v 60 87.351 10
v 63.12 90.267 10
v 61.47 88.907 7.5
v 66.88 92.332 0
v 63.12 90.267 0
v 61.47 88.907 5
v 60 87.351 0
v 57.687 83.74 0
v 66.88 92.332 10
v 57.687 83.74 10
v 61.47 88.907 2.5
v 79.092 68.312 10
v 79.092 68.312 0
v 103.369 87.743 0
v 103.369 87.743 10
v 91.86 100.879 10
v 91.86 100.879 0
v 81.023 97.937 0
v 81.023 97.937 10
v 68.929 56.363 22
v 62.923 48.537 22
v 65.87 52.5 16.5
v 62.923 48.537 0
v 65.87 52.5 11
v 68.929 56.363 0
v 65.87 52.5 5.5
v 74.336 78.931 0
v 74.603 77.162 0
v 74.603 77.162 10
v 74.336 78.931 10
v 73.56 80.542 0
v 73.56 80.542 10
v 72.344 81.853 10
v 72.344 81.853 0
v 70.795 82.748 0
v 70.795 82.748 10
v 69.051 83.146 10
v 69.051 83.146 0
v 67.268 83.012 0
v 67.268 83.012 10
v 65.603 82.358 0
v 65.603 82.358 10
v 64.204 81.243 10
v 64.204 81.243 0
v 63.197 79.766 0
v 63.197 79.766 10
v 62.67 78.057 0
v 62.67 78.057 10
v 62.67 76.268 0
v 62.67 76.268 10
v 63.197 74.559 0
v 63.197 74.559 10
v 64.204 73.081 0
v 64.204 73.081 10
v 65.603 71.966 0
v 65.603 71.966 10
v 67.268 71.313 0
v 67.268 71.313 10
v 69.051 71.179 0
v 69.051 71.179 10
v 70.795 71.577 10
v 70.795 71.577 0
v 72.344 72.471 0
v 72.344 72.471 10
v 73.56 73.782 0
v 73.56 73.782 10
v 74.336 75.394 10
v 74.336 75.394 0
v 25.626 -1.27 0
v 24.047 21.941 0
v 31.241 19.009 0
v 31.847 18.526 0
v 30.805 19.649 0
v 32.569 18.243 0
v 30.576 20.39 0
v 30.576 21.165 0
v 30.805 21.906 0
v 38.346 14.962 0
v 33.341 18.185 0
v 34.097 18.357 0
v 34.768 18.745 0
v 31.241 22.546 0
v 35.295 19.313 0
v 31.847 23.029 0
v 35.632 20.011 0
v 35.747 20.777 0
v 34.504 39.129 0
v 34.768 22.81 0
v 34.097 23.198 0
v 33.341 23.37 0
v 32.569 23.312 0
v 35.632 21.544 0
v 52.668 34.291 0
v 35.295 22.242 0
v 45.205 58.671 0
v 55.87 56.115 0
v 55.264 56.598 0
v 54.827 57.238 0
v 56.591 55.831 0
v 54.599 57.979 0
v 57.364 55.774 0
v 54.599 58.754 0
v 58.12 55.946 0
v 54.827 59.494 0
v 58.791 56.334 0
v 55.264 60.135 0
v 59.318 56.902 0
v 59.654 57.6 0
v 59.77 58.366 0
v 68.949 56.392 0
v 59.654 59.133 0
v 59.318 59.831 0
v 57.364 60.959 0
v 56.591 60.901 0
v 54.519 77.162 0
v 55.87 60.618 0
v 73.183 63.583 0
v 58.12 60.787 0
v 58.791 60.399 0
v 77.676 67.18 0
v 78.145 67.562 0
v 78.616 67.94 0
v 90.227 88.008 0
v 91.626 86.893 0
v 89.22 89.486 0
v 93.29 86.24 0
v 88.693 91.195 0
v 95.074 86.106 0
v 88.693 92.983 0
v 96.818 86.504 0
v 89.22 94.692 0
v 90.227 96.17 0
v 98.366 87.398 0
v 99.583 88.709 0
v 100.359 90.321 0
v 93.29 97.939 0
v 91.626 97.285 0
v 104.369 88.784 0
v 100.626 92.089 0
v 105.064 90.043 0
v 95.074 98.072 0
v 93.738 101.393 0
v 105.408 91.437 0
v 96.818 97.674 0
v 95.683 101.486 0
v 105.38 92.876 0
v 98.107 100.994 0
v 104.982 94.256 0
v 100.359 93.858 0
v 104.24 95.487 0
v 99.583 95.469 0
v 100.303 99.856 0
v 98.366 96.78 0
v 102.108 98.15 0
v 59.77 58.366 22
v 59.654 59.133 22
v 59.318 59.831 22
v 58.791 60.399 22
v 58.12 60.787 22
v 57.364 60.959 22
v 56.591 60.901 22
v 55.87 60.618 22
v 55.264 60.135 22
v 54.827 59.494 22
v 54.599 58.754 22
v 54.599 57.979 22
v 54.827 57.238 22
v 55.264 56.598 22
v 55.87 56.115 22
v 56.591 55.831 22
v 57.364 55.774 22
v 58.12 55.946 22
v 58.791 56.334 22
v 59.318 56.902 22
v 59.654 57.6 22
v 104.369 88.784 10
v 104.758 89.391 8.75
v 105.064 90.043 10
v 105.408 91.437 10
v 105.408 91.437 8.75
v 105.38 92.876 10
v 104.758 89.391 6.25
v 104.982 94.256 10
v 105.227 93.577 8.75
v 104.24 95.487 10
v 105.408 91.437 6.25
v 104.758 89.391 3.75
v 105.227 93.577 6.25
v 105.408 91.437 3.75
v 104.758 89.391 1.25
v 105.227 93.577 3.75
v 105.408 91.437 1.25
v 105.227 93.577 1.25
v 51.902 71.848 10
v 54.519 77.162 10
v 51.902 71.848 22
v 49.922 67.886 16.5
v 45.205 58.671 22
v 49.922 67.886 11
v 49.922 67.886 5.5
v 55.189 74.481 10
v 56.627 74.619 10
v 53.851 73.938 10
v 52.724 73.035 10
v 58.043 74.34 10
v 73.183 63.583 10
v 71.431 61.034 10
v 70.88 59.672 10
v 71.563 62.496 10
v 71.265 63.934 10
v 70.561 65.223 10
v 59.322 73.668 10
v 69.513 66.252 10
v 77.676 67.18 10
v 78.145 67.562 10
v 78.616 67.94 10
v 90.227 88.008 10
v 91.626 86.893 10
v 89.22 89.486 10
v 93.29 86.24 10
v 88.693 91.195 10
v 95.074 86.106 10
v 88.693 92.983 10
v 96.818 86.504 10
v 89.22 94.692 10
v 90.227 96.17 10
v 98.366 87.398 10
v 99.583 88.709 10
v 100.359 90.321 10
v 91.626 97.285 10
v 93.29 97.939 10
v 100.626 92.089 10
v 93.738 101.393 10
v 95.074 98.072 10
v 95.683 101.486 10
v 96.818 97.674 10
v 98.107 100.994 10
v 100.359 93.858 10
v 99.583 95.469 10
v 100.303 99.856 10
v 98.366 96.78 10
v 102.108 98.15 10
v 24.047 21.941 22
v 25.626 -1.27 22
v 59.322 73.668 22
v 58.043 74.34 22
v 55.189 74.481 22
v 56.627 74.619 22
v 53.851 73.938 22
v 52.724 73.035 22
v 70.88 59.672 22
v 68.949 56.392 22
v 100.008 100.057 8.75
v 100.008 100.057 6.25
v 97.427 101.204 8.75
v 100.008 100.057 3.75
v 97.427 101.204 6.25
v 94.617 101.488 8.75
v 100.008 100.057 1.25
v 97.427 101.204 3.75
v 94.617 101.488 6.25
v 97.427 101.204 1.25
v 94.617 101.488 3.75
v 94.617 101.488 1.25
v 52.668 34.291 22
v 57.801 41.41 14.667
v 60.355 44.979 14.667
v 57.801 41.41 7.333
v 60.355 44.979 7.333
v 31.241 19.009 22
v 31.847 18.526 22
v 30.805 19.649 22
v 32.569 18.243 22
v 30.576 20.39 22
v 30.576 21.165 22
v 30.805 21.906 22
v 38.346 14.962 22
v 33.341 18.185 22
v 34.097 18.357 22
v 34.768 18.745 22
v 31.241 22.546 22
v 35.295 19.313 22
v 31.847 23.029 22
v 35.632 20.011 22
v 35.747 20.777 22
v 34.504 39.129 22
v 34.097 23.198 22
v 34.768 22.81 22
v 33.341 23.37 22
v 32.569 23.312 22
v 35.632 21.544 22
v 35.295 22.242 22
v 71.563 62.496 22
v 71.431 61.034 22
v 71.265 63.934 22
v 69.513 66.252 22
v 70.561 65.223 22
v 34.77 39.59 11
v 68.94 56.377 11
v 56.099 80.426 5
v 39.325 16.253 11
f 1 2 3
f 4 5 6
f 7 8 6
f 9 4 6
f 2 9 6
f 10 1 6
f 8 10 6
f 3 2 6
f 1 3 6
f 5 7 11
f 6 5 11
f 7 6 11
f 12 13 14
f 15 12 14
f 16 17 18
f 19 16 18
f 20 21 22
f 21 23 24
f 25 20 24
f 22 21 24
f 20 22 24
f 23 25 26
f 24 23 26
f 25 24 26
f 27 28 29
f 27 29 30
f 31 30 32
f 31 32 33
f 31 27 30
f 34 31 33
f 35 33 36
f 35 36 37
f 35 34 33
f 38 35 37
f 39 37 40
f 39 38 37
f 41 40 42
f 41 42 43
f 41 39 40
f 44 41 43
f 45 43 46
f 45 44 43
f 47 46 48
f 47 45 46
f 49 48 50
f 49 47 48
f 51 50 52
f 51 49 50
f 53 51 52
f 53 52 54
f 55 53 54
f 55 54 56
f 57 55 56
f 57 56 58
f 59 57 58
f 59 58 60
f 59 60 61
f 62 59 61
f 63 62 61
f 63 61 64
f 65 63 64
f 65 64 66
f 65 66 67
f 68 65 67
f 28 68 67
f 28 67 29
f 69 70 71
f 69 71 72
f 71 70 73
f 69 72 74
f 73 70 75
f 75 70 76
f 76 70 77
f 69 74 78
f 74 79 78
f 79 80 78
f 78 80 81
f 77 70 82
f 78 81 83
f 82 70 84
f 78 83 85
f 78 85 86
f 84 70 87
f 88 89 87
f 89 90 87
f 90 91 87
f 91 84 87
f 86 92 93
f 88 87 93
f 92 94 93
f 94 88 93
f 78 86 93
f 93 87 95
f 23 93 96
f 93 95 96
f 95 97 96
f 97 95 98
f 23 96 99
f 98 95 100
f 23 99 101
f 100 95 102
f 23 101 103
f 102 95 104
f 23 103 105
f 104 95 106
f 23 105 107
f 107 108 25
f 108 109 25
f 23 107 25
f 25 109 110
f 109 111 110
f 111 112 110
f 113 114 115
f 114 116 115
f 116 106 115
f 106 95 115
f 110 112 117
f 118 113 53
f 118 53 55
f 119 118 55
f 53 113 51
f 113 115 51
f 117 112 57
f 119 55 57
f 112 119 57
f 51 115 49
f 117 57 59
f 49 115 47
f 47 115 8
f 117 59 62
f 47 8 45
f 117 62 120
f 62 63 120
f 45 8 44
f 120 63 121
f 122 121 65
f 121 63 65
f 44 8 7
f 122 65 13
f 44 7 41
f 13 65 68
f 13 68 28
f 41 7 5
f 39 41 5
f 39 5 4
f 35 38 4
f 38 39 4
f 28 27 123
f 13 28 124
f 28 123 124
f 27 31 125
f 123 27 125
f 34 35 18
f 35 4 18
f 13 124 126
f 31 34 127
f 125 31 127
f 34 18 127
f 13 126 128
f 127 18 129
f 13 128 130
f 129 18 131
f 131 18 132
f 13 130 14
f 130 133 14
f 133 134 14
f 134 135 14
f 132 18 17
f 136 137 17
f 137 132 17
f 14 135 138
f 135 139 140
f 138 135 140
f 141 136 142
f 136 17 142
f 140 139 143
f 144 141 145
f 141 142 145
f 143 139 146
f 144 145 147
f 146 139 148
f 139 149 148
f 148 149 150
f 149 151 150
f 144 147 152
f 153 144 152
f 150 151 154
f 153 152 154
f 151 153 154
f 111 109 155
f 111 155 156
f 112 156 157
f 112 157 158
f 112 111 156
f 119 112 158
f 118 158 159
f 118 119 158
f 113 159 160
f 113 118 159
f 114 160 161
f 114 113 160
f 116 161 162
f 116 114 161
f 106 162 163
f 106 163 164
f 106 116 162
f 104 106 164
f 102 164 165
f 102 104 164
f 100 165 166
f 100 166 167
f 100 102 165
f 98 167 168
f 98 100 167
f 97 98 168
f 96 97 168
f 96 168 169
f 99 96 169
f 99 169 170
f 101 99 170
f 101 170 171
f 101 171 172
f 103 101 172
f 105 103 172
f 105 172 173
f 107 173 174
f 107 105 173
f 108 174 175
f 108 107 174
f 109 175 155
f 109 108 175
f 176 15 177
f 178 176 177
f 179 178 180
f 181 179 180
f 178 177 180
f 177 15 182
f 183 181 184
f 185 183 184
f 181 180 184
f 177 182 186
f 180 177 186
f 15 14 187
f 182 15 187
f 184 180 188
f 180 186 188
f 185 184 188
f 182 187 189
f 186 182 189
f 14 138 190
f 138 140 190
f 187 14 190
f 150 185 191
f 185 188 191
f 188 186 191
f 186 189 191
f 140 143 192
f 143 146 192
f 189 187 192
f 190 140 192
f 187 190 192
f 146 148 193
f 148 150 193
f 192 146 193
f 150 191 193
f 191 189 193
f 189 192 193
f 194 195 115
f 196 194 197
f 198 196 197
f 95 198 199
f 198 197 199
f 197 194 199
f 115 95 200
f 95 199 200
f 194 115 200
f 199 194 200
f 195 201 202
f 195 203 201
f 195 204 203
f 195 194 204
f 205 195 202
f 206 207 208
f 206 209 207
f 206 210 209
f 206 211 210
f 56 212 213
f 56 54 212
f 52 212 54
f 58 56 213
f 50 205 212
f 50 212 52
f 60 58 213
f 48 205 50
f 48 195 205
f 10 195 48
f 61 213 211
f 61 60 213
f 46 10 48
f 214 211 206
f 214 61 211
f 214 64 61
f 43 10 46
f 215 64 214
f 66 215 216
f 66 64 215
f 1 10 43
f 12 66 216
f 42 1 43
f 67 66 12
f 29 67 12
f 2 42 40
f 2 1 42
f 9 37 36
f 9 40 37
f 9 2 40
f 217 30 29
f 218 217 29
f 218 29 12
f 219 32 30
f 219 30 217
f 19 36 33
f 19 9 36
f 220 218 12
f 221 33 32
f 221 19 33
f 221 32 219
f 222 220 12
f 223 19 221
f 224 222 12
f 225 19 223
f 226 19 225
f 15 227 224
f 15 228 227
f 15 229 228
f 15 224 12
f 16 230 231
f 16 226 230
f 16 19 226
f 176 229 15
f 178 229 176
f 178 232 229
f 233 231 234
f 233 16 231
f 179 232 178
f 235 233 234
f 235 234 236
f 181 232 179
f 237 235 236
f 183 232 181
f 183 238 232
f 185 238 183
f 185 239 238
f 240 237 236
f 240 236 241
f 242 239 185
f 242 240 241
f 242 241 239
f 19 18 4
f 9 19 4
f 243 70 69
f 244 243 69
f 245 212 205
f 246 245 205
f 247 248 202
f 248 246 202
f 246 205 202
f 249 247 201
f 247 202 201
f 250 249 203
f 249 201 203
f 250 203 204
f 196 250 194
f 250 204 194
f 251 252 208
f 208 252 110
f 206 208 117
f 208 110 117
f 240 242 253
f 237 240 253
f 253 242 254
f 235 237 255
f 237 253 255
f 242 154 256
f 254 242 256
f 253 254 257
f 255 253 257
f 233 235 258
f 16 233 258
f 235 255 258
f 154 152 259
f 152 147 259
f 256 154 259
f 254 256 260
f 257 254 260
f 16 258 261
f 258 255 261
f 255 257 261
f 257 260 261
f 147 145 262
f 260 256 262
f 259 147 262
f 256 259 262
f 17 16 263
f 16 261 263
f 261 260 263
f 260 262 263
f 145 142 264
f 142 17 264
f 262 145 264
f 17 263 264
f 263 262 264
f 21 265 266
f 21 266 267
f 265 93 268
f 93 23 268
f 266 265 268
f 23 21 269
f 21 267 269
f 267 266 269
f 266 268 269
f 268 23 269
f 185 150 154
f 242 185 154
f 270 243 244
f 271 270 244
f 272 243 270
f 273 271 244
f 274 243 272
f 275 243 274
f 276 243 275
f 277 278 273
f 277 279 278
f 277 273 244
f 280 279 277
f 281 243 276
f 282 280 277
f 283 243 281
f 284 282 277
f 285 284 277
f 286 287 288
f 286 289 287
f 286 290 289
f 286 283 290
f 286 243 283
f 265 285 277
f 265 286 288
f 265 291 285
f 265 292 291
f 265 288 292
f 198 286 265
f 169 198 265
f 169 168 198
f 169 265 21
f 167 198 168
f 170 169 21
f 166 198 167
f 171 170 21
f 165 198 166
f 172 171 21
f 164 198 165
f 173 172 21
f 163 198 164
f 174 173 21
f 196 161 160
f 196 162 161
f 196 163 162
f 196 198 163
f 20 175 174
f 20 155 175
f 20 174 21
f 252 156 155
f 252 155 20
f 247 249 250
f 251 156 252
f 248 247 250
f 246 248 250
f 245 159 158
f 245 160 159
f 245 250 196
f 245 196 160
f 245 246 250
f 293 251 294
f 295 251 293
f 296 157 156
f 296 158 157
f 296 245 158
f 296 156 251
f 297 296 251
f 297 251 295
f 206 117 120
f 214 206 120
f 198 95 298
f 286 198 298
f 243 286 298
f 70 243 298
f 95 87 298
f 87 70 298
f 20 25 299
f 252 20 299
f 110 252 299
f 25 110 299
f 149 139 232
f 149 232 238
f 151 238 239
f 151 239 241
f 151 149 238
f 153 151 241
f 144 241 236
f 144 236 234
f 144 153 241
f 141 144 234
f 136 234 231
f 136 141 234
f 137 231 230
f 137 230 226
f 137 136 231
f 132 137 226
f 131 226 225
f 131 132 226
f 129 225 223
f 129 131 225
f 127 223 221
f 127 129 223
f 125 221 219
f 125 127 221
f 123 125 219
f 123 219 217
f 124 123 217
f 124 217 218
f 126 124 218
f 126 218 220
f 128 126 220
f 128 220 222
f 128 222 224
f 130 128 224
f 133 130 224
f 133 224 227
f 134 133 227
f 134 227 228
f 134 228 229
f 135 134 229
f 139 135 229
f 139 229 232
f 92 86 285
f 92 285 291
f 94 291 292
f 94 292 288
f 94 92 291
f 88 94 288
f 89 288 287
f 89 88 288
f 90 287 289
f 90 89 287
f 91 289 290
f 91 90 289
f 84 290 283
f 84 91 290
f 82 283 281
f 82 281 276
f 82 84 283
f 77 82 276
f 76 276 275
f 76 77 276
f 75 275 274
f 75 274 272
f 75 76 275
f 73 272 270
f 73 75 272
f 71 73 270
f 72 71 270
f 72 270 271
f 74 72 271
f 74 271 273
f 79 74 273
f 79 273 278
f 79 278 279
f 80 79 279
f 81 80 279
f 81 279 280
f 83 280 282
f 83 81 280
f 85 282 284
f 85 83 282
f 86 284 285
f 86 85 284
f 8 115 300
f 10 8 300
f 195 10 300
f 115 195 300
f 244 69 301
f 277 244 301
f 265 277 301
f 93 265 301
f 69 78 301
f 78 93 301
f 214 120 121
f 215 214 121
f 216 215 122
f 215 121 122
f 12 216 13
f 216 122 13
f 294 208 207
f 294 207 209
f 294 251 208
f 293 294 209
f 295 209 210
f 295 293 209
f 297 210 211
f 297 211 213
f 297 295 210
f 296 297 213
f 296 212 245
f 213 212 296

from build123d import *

# Parameters (mm, degrees)
SKETCH_1_R              = 6
SKETCH_1_R_2            = 2.6
EXTRUDE_1_DEPTH         = 22
CUT_EXTRUDE_START       = -12
CUT_EXTRUDE_1_OUTLINE_R = 6
CUT_EXTRUDE_1_DEPTH     = 12
FILLET_1_R              = 5


# Read off the part's stored shape, not the designer's step: 切除-拉伸1
with BuildPart() as part:
    # 草图1 → 凸台-拉伸1 (new body)
    with BuildSketch(Plane.XY):
        with BuildLine():
            Line((24.04705584, 21.941390991), (25.62631028, -1.269568576))
            add(Edge.make_bspline(
                [(25.62631028, -1.269568576), (30.294741582, 4.490329629), (34.848985416, 10.341994574), (43.840833171, 22.214968329), (48.277316557, 28.236694952), (52.668077763, 34.291262241)],
                knots=[0.751086715, 0.751086715, 0.751086715, 0.751086715, 0.875, 0.875, 1, 1, 1, 1], degree=3))
            add(Edge.make_bspline(
                [(52.668077763, 34.291262241), (54.385569076, 36.659627804), (56.095877797, 39.033185186), (58.65356822, 42.599078019), (59.503877121, 43.78931812), (61.206685795, 46.168192958), (62.060572053, 47.355980663), (62.923151952, 48.537325445)],
                knots=[0, 0, 0, 0, 12.867122322, 12.867122322, 19.300683483, 19.300683483, 25.734244644, 25.734244644, 25.734244644, 25.734244644], degree=3))
            add(Edge.make_bspline(
                [(62.923151952, 48.537325445), (63.691030086, 49.593267388), (64.385737457, 50.528608987), (65.152866174, 51.561457391), (65.870104463, 52.500349083), (66.644032214, 53.513449395), (67.382538536, 54.446906012), (68.169071386, 55.441067159), (68.929366855, 56.362602713)],
                knots=[0, 0, 0, 0.25, 0.25, 0.5, 0.5, 0.75, 0.75, 1, 1, 1], degree=2))
            add(Edge.make_bspline(
                [(68.929366855, 56.362602713), (68.939807825, 56.376913703), (68.94904286, 56.392240586)],
                knots=[0.088106579, 0.088106579, 0.088106579, 0.143786066, 0.143786066, 0.143786066], degree=2, weights=[1, 0.999612499, 1]))
            Line((68.94904286, 56.392240586), (73.182530774, 63.58271012))
            Line((73.182530774, 63.58271012), (77.6764923, 67.17962487))
            ThreePointArc((77.6764923, 67.17962487), (78.379967095, 67.75128437), (79.091839453, 68.312452009))
            Line((79.091839453, 68.312452009), (103.36876376, 87.743421018))
            add(Edge.make_bspline(
                [(103.36876376, 87.743421018), (103.794913212, 88.083498112), (104.14591982, 88.500209303), (104.495810247, 88.915595377), (104.757584433, 89.390611784), (105.019785316, 89.866402479), (105.18387744, 90.383514181), (105.347603834, 90.89947334), (105.407790685, 91.436682712), (105.468371762, 91.977410832), (105.422168005, 92.518813243), (105.376170251, 93.057801763), (105.226513558, 93.576866403), (105.075866476, 94.099366077), (104.826403144, 94.581721125), (104.577389608, 95.06320646), (104.239613139, 95.486702432)],
                knots=[0, 0, 0, 0.125, 0.125, 0.25, 0.25, 0.375, 0.375, 0.5, 0.5, 0.625, 0.625, 0.75, 0.75, 0.875, 0.875, 1, 1, 1], degree=2))
            Line((104.239613139, 95.486702432), (102.10787197, 98.150082549))
            add(Edge.make_bspline(
                [(102.10787197, 98.150082549), (101.662660323, 98.707408746), (101.134816221, 99.186660834), (100.605787322, 99.666988651), (100.007698858, 100.056631193), (99.413800036, 100.443544268), (98.766951597, 100.73157288), (98.115443256, 101.021676452), (97.426848492, 101.204456829), (96.741213417, 101.386451586), (96.036172435, 101.457788474), (95.327397899, 101.529503128), (94.616958411, 101.487928839), (93.907956416, 101.446438671), (93.215156177, 101.29350915), (92.520746602, 101.140224382), (91.859708878, 100.879055504)],
                knots=[0, 0, 0, 0.125, 0.125, 0.25, 0.25, 0.375, 0.375, 0.5, 0.5, 0.625, 0.625, 0.75, 0.75, 0.875, 0.875, 1, 1, 1], degree=2))
            Line((91.859708878, 100.879055504), (81.022663549, 97.937140274))
            Line((81.022663549, 97.937140274), (66.880013026, 92.33227511))
            add(Edge.make_bspline(
                [(66.880013026, 92.33227511), (65.373977149, 91.735592871), (64.00578846, 90.868278931), (62.646323986, 90.006495393), (61.470305816, 88.907497765), (60.292351586, 87.806690876), (59.339427675, 86.506195587), (58.383073515, 85.201018894), (57.686838347, 83.740417625)],
                knots=[0, 0, 0, 0.25, 0.25, 0.5, 0.5, 0.75, 0.75, 1, 1, 1], degree=2))
            add(Edge.make_bspline(
                [(57.686838347, 83.740417625), (56.095548431, 80.401632953), (54.518583687, 77.162280014)],
                knots=[0, 0, 0, 1, 1, 1], degree=2))
            add(Edge.make_bspline(
                [(54.518583687, 77.162280014), (53.763269837, 75.610969128), (52.999745837, 74.063699923), (51.467519232, 70.971710828), (50.697291265, 69.427763476), (49.146563784, 66.345016376), (48.366275895, 64.806128726), (46.794629467, 61.734063391), (46.003946156, 60.200522916), (45.205011248, 58.67121375)],
                knots=[0, 0, 0, 0, 0.25, 0.25, 0.5, 0.5, 0.75, 0.75, 1, 1, 1, 1], degree=3))
            add(Edge.make_bspline(
                [(45.205011248, 58.67121375), (41.847412181, 52.245521434), (38.381271035, 45.876195204), (31.340232317, 33.621328767), (27.77883413, 27.726649653), (24.04705584, 21.941390991)],
                knots=[0, 0, 0, 0, 0.125, 0.125, 0.243696274, 0.243696274, 0.243696274, 0.243696274], degree=3))
        make_face()
        with Locations((94.625559773, 92.089088396)):
            Circle(SKETCH_1_R, mode=Mode.SUBTRACT)
        with Locations((68.602677697, 77.162280014)):
            Circle(SKETCH_1_R, mode=Mode.SUBTRACT)
        with Locations((33.14705584, 20.777472123)):
            Circle(SKETCH_1_R_2, mode=Mode.SUBTRACT)
        with Locations((57.169835175, 58.366266824)):
            Circle(SKETCH_1_R_2, mode=Mode.SUBTRACT)
    extrude(amount=EXTRUDE_1_DEPTH)

    # 切除-拉伸1 outline → 切除-拉伸1 (cut)
    with BuildSketch(Plane.XY.offset(22).offset(CUT_EXTRUDE_START)):
        with BuildLine():
            add(Edge.make_bspline(
                [(57.686838346, 83.740417623), (56.09554843, 80.401632953), (54.518583688, 77.162280014)],
                knots=[0.494428836, 0.494428836, 0.494428836, 0.494587311, 0.494587311, 0.494587311], degree=2))
            Line((54.518583688, 77.162280014), (73.182530774, 63.58271012))
            Line((73.182530774, 63.58271012), (77.6764923, 67.17962487))
            ThreePointArc((77.6764923, 67.17962487), (78.379967095, 67.75128437), (79.091839453, 68.312452009))
            Line((79.091839453, 68.312452009), (103.36876376, 87.743421018))
            add(Edge.make_bspline(
                [(103.36876376, 87.743421018), (103.794913212, 88.083498112), (104.14591982, 88.500209303), (104.495810247, 88.915595377), (104.757584433, 89.390611784), (105.019785316, 89.866402479), (105.18387744, 90.383514181), (105.347603834, 90.89947334), (105.407790685, 91.436682712), (105.468371762, 91.977410832), (105.422168005, 92.518813243), (105.376170251, 93.057801763), (105.226513558, 93.576866403), (105.075866476, 94.099366077), (104.826403144, 94.581721125), (104.577389608, 95.06320646), (104.239613139, 95.486702432)],
                knots=[0, 0, 0, 0.125, 0.125, 0.25, 0.25, 0.375, 0.375, 0.5, 0.5, 0.625, 0.625, 0.75, 0.75, 0.875, 0.875, 1, 1, 1], degree=2))
            Line((104.239613139, 95.486702432), (102.10787197, 98.150082549))
            add(Edge.make_bspline(
                [(102.10787197, 98.150082549), (101.662660323, 98.707408746), (101.134816221, 99.186660834), (100.605787322, 99.666988651), (100.007698858, 100.056631193), (99.413800036, 100.443544268), (98.766951597, 100.73157288), (98.115443256, 101.021676452), (97.426848492, 101.204456829), (96.741213417, 101.386451586), (96.036172435, 101.457788474), (95.327397899, 101.529503128), (94.616958411, 101.487928839), (93.907956416, 101.446438671), (93.215156177, 101.29350915), (92.520746602, 101.140224382), (91.859708878, 100.879055504)],
                knots=[0, 0, 0, 0.125, 0.125, 0.25, 0.25, 0.375, 0.375, 0.5, 0.5, 0.625, 0.625, 0.75, 0.75, 0.875, 0.875, 1, 1, 1], degree=2))
            Line((91.859708878, 100.879055504), (81.022663549, 97.937140274))
            Line((81.022663549, 97.937140274), (66.880013026, 92.33227511))
            add(Edge.make_bspline(
                [(66.880013026, 92.33227511), (65.373977149, 91.735592871), (64.00578846, 90.868278931), (62.646323986, 90.006495393), (61.470305816, 88.907497765), (60.292351586, 87.806690876), (59.339427675, 86.506195587), (58.383073515, 85.201018894), (57.686838346, 83.740417623)],
                knots=[0, 0, 0, 0.25, 0.25, 0.5, 0.5, 0.75, 0.75, 1, 1, 1], degree=2))
        make_face()
        with Locations((68.602677697, 77.162280014)):
            Circle(CUT_EXTRUDE_1_OUTLINE_R, mode=Mode.SUBTRACT)
        with Locations((94.625559773, 92.089088396)):
            Circle(CUT_EXTRUDE_1_OUTLINE_R, mode=Mode.SUBTRACT)
    extrude(amount=CUT_EXTRUDE_1_DEPTH, mode=Mode.SUBTRACT)

    # 圆角1
    fillet_1_edges = [part.edges().sort_by_distance(p)[0] for p in [
        (73.182530774, 63.58271012, 16),
    ]]
    fillet(fillet_1_edges, radius=FILLET_1_R)
    # the kernel refuses this fillet: 5 mm, written as the material it takes off along each edge
    with BuildSketch(Plane(origin=(54.518583687, 77.162280014, 10), x_dir=(0.8086167393984858, -0.5883357619289866, 0), z_dir=(0, 0, 1))) as fillet_1_2_piece_1:
        with BuildLine():
            CenterArc((5.939761688, -5), FILLET_1_R, 89.999999998, 99.633547548)
            Line((1.010270575, -5.836730169), (0.911680753, -5.853464772))
            ThreePointArc((0.911680753, -5.853464772), (0.412045155, -2.934442011), (-0.098457006, -0.017499087))
            Line((-0.098457006, -0.017499087), (0, 0.1))
            Line((0, 0.1), (5.939761688, 0.1))
            Line((5.939761688, 0.1), (5.939761688, 0))
        make_face()
    extrude(amount=26.849404219, mode=Mode.SUBTRACT)


solid = part.part
